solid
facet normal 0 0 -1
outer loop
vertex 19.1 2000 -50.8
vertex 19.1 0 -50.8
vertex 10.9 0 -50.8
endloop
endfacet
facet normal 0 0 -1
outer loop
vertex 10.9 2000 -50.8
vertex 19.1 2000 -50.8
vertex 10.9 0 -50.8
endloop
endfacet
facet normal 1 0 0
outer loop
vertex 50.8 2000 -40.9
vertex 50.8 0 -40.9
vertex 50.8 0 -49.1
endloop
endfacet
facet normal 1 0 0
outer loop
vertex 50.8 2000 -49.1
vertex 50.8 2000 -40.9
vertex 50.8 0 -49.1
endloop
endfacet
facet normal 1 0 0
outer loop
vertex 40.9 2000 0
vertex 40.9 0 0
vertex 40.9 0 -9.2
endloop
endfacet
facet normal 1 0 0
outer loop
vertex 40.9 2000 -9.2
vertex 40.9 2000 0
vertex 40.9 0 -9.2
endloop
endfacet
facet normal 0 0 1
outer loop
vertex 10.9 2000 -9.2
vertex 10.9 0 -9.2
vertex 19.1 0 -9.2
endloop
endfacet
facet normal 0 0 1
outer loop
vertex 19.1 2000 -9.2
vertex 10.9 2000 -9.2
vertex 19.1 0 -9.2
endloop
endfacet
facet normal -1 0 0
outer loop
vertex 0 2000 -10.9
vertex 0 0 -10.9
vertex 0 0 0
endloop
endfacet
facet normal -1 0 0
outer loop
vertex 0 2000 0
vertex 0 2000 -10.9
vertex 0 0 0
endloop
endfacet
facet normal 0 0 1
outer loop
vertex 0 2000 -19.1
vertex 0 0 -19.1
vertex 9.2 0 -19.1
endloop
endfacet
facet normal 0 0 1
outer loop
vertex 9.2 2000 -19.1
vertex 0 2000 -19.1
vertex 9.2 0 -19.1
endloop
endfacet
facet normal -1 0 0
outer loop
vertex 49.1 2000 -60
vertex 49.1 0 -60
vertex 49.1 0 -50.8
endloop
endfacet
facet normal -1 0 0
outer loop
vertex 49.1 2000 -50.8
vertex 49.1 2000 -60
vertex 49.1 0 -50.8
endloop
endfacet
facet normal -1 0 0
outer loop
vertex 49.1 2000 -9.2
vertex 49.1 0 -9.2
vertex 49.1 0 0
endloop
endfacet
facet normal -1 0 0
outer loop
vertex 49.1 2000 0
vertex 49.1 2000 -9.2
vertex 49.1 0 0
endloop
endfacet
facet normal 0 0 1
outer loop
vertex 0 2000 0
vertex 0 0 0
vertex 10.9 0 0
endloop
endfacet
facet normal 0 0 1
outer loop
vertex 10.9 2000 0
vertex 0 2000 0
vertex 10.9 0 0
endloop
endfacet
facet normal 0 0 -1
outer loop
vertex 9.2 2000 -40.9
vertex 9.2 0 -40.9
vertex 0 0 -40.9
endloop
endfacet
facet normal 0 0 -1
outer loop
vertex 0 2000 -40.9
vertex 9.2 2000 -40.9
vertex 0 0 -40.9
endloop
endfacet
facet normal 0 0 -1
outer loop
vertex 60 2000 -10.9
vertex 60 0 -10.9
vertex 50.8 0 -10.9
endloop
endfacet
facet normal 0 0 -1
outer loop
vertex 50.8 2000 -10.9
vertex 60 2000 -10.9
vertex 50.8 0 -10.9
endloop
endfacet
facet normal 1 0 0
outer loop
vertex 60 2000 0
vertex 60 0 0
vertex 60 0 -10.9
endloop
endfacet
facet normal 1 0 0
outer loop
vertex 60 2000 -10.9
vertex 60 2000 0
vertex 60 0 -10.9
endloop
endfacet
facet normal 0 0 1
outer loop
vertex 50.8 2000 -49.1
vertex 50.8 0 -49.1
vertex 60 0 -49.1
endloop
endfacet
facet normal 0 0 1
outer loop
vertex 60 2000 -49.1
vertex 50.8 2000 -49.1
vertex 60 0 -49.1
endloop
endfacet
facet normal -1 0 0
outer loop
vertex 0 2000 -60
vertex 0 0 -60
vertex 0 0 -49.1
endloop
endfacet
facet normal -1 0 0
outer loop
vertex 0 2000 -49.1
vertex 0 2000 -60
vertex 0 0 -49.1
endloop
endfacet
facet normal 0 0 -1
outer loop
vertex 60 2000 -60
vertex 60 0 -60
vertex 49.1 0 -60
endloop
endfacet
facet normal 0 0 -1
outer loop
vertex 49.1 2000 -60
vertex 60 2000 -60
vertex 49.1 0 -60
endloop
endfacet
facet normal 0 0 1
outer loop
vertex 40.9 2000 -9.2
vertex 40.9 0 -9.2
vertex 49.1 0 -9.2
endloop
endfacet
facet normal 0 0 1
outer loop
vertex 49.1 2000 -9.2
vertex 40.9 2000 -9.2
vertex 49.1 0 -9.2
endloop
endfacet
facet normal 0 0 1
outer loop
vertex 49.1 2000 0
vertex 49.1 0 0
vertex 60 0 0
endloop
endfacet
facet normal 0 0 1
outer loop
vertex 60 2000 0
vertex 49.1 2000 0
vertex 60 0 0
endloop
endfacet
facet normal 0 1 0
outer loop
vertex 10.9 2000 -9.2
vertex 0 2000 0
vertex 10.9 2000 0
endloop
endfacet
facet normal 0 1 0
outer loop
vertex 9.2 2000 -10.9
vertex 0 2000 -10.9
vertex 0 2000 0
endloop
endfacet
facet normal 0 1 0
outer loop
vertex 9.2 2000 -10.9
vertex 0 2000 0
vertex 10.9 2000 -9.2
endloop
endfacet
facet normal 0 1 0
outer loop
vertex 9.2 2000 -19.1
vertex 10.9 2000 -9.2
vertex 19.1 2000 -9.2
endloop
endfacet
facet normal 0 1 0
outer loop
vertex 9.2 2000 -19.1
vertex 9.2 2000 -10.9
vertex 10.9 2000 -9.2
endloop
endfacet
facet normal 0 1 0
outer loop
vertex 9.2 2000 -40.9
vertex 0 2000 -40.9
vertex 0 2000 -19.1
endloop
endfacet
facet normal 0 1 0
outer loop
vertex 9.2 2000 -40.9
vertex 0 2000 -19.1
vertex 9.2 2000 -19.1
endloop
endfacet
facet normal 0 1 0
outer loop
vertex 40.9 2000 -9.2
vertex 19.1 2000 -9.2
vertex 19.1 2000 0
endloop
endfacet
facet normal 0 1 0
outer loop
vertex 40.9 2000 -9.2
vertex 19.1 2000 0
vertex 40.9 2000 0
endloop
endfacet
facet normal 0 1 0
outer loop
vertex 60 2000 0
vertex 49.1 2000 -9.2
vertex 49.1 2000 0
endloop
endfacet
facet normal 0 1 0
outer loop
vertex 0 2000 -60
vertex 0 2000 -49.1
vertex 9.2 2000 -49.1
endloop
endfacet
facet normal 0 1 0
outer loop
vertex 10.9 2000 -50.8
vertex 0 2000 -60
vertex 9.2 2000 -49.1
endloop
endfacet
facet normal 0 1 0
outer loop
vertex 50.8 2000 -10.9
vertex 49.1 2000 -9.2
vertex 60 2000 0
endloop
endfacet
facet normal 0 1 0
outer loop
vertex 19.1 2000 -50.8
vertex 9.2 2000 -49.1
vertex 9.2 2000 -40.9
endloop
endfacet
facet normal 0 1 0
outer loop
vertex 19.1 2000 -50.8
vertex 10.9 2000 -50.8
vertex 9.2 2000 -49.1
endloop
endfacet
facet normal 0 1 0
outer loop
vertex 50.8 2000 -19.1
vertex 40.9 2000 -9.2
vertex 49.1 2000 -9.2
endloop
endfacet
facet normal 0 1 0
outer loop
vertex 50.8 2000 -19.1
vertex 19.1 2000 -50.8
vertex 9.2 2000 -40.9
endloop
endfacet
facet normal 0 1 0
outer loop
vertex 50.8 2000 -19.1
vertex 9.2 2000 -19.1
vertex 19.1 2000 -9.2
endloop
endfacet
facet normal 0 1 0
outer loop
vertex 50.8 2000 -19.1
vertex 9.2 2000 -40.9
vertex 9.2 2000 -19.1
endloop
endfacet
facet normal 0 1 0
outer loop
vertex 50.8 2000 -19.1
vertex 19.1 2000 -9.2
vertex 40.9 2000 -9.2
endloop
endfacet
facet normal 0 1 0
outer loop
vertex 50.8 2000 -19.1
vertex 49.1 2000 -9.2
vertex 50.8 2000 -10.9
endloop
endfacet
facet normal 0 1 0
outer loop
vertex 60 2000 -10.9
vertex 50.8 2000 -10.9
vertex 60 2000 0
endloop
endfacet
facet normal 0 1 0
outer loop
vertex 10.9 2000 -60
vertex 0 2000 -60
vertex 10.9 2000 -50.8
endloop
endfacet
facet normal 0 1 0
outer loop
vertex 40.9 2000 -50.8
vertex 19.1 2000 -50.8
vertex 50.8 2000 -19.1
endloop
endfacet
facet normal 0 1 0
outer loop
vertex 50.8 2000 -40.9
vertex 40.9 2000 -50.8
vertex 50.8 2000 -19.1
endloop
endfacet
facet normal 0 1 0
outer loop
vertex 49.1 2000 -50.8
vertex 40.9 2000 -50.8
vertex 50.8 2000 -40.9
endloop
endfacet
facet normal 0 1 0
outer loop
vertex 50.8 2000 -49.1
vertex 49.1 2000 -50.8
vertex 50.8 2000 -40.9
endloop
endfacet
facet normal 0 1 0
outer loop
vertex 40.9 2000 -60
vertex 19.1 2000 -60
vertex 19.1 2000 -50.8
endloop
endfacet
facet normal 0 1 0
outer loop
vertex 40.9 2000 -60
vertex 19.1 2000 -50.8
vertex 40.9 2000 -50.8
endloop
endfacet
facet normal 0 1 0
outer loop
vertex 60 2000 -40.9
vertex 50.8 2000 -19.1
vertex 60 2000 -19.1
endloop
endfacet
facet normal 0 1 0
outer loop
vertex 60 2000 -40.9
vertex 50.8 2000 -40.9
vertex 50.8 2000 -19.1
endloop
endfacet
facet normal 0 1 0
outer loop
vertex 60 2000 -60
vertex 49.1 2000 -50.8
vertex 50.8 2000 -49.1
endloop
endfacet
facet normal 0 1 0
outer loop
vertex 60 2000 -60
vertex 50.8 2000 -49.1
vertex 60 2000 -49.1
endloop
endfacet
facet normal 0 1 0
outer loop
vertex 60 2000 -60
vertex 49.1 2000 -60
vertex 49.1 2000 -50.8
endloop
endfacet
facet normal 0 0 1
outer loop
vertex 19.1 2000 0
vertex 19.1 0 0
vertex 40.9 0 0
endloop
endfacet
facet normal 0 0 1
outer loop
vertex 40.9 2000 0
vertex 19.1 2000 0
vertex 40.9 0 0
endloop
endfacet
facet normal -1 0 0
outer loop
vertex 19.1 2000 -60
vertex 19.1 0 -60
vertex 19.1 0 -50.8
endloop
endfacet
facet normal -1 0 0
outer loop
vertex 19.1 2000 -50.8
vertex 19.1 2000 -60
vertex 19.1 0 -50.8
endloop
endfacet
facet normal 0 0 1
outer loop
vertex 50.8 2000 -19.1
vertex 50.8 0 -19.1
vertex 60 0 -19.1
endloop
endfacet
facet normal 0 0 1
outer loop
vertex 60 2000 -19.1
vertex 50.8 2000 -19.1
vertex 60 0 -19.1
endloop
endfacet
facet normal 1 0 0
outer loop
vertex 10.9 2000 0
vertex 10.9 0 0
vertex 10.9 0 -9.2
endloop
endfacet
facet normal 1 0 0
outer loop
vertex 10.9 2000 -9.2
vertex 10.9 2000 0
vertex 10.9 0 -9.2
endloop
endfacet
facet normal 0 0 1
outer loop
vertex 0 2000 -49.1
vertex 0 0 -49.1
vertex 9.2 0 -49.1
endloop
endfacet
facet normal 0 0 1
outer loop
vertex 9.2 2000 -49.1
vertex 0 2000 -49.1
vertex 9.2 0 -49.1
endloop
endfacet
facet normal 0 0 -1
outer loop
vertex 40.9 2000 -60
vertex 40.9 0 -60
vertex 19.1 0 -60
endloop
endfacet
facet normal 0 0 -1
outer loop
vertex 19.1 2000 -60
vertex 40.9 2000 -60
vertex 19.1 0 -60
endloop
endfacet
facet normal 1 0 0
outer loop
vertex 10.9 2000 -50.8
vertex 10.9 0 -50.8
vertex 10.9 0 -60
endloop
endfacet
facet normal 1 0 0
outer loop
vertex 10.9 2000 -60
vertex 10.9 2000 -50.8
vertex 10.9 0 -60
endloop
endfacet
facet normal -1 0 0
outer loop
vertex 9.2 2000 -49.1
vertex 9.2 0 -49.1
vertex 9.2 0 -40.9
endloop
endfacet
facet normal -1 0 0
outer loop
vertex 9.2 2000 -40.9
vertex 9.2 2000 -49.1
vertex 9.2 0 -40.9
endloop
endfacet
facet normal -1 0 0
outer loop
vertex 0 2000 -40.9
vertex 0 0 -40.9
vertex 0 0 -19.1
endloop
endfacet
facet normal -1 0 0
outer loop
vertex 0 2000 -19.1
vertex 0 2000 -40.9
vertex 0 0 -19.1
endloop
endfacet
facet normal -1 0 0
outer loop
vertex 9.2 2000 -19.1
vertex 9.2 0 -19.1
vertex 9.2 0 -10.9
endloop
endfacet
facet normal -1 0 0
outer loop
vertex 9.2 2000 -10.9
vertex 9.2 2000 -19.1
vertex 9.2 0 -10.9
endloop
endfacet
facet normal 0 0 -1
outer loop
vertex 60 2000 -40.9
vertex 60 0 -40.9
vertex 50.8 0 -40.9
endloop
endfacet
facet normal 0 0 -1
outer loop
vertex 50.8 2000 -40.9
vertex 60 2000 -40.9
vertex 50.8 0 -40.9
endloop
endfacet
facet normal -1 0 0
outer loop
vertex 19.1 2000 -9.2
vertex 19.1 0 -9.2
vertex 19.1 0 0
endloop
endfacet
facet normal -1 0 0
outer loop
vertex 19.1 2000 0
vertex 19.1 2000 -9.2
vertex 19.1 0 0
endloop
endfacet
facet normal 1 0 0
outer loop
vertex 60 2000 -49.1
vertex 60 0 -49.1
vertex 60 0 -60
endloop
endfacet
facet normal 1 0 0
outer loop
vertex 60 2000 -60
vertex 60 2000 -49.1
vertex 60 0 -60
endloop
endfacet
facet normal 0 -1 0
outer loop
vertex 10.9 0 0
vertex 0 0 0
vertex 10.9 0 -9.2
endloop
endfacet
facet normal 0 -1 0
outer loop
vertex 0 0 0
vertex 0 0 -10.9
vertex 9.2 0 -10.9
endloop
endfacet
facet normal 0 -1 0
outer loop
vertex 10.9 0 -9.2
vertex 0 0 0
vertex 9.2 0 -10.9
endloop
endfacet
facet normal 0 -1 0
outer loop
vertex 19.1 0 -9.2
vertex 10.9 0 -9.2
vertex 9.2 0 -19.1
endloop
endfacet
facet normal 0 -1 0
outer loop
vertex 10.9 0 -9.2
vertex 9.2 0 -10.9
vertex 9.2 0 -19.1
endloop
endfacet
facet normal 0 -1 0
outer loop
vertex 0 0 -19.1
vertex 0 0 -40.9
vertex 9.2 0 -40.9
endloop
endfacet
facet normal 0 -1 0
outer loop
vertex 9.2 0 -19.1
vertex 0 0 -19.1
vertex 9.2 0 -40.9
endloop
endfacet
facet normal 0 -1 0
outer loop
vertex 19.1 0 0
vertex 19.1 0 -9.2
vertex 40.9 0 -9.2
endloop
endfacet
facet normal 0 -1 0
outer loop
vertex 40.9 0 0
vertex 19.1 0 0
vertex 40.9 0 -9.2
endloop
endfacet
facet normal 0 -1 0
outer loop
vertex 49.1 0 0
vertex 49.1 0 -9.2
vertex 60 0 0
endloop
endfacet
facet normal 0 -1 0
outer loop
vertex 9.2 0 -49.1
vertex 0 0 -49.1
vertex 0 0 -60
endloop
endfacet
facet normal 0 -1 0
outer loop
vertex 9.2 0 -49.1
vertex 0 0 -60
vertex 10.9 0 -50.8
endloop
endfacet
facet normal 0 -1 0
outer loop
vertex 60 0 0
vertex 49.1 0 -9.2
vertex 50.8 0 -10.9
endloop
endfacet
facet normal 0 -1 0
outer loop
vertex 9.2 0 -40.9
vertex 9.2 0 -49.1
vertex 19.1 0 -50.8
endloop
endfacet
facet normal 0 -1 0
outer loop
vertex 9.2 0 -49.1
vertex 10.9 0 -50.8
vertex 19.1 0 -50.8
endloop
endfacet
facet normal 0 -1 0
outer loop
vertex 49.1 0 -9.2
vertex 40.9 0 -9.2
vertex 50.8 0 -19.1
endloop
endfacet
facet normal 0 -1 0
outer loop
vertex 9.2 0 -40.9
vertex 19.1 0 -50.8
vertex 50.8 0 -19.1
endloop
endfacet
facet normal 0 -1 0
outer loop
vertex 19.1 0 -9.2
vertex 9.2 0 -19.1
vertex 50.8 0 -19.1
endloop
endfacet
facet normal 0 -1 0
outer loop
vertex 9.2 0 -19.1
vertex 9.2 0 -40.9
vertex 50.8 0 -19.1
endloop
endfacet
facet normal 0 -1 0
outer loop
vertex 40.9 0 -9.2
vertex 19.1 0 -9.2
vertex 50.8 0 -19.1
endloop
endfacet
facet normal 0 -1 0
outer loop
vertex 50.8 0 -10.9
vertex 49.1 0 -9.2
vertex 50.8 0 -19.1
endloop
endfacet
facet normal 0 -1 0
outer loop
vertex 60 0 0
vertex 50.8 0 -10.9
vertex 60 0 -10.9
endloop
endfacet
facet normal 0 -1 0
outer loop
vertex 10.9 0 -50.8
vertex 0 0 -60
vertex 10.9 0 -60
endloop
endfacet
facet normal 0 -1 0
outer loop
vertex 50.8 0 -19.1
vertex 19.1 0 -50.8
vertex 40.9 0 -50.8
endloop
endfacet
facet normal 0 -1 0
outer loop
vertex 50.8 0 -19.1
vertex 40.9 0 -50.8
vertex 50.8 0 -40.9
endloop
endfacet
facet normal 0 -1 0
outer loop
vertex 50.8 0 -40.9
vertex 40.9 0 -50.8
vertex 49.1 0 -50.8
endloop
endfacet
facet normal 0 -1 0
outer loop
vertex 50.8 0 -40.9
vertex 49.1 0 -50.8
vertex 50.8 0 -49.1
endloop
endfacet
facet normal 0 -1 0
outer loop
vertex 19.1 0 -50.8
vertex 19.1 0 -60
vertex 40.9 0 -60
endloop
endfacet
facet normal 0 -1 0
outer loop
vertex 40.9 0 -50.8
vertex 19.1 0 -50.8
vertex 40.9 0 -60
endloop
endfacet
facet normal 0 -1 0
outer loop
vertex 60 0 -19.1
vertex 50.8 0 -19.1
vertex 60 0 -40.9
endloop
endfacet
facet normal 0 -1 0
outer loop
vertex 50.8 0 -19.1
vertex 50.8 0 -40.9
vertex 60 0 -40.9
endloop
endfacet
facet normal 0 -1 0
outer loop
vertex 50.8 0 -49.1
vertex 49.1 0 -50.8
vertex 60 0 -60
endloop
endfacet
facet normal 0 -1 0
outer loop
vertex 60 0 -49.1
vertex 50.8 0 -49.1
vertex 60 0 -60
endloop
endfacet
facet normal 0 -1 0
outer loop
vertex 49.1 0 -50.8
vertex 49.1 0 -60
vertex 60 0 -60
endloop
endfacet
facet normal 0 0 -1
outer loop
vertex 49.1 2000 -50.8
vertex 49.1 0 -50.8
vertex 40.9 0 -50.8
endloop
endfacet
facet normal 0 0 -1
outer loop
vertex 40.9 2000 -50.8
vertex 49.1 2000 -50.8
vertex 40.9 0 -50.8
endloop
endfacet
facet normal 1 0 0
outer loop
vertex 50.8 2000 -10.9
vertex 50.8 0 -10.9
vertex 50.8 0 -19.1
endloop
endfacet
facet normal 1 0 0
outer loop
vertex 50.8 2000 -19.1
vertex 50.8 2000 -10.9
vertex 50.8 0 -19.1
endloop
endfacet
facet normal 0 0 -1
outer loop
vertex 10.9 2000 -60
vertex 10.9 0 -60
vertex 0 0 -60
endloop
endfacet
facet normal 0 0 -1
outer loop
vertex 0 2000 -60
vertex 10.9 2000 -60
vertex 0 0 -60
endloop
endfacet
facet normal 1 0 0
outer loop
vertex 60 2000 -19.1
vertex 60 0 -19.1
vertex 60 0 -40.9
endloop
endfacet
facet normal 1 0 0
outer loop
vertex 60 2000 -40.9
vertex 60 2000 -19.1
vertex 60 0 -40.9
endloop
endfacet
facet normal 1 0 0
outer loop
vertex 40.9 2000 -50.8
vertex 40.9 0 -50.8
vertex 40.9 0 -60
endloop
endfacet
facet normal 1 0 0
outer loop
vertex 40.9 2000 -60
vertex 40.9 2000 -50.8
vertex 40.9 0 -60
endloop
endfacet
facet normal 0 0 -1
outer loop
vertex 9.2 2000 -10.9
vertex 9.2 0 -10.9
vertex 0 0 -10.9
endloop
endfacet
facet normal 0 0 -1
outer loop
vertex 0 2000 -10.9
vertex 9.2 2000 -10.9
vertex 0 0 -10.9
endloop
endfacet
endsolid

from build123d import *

# Parameters (mm, degrees)
EXTRUDE_1_DEPTH = 2000


with BuildPart() as part:
    # 草图1 → 凸台-拉伸1 (new body)
    with BuildSketch(Plane(origin=(0, 0, 0), x_dir=(1, 0, 0), z_dir=(0, 1, 0))):
        Polygon((10.9, 60), (0, 60), (0, 49.1), (9.2, 49.1), (9.2, 40.9), (0, 40.9), (0, 30), (30, 30), (30, 60), (19.1, 60), (19.1, 50.8), (10.9, 50.8), align=None)
        Polygon((30, 30), (0, 30), (0, 19.1), (9.2, 19.1), (9.2, 10.9), (0, 10.9), (0, 0), (10.9, 0), (10.9, 9.2), (19.1, 9.2), (19.1, 0), (40.9, 0), (40.9, 9.2), (49.1, 9.2), (49.1, 0), (60, 0), (60, 10.9), (50.8, 10.9), (50.8, 19.1), (60, 19.1), (60, 40.9), (50.8, 40.9), (50.8, 49.1), (60, 49.1), (60, 60), (49.1, 60), (49.1, 50.8), (40.9, 50.8), (40.9, 60), (30, 60), align=None)
    extrude(amount=EXTRUDE_1_DEPTH)


solid = part.part
